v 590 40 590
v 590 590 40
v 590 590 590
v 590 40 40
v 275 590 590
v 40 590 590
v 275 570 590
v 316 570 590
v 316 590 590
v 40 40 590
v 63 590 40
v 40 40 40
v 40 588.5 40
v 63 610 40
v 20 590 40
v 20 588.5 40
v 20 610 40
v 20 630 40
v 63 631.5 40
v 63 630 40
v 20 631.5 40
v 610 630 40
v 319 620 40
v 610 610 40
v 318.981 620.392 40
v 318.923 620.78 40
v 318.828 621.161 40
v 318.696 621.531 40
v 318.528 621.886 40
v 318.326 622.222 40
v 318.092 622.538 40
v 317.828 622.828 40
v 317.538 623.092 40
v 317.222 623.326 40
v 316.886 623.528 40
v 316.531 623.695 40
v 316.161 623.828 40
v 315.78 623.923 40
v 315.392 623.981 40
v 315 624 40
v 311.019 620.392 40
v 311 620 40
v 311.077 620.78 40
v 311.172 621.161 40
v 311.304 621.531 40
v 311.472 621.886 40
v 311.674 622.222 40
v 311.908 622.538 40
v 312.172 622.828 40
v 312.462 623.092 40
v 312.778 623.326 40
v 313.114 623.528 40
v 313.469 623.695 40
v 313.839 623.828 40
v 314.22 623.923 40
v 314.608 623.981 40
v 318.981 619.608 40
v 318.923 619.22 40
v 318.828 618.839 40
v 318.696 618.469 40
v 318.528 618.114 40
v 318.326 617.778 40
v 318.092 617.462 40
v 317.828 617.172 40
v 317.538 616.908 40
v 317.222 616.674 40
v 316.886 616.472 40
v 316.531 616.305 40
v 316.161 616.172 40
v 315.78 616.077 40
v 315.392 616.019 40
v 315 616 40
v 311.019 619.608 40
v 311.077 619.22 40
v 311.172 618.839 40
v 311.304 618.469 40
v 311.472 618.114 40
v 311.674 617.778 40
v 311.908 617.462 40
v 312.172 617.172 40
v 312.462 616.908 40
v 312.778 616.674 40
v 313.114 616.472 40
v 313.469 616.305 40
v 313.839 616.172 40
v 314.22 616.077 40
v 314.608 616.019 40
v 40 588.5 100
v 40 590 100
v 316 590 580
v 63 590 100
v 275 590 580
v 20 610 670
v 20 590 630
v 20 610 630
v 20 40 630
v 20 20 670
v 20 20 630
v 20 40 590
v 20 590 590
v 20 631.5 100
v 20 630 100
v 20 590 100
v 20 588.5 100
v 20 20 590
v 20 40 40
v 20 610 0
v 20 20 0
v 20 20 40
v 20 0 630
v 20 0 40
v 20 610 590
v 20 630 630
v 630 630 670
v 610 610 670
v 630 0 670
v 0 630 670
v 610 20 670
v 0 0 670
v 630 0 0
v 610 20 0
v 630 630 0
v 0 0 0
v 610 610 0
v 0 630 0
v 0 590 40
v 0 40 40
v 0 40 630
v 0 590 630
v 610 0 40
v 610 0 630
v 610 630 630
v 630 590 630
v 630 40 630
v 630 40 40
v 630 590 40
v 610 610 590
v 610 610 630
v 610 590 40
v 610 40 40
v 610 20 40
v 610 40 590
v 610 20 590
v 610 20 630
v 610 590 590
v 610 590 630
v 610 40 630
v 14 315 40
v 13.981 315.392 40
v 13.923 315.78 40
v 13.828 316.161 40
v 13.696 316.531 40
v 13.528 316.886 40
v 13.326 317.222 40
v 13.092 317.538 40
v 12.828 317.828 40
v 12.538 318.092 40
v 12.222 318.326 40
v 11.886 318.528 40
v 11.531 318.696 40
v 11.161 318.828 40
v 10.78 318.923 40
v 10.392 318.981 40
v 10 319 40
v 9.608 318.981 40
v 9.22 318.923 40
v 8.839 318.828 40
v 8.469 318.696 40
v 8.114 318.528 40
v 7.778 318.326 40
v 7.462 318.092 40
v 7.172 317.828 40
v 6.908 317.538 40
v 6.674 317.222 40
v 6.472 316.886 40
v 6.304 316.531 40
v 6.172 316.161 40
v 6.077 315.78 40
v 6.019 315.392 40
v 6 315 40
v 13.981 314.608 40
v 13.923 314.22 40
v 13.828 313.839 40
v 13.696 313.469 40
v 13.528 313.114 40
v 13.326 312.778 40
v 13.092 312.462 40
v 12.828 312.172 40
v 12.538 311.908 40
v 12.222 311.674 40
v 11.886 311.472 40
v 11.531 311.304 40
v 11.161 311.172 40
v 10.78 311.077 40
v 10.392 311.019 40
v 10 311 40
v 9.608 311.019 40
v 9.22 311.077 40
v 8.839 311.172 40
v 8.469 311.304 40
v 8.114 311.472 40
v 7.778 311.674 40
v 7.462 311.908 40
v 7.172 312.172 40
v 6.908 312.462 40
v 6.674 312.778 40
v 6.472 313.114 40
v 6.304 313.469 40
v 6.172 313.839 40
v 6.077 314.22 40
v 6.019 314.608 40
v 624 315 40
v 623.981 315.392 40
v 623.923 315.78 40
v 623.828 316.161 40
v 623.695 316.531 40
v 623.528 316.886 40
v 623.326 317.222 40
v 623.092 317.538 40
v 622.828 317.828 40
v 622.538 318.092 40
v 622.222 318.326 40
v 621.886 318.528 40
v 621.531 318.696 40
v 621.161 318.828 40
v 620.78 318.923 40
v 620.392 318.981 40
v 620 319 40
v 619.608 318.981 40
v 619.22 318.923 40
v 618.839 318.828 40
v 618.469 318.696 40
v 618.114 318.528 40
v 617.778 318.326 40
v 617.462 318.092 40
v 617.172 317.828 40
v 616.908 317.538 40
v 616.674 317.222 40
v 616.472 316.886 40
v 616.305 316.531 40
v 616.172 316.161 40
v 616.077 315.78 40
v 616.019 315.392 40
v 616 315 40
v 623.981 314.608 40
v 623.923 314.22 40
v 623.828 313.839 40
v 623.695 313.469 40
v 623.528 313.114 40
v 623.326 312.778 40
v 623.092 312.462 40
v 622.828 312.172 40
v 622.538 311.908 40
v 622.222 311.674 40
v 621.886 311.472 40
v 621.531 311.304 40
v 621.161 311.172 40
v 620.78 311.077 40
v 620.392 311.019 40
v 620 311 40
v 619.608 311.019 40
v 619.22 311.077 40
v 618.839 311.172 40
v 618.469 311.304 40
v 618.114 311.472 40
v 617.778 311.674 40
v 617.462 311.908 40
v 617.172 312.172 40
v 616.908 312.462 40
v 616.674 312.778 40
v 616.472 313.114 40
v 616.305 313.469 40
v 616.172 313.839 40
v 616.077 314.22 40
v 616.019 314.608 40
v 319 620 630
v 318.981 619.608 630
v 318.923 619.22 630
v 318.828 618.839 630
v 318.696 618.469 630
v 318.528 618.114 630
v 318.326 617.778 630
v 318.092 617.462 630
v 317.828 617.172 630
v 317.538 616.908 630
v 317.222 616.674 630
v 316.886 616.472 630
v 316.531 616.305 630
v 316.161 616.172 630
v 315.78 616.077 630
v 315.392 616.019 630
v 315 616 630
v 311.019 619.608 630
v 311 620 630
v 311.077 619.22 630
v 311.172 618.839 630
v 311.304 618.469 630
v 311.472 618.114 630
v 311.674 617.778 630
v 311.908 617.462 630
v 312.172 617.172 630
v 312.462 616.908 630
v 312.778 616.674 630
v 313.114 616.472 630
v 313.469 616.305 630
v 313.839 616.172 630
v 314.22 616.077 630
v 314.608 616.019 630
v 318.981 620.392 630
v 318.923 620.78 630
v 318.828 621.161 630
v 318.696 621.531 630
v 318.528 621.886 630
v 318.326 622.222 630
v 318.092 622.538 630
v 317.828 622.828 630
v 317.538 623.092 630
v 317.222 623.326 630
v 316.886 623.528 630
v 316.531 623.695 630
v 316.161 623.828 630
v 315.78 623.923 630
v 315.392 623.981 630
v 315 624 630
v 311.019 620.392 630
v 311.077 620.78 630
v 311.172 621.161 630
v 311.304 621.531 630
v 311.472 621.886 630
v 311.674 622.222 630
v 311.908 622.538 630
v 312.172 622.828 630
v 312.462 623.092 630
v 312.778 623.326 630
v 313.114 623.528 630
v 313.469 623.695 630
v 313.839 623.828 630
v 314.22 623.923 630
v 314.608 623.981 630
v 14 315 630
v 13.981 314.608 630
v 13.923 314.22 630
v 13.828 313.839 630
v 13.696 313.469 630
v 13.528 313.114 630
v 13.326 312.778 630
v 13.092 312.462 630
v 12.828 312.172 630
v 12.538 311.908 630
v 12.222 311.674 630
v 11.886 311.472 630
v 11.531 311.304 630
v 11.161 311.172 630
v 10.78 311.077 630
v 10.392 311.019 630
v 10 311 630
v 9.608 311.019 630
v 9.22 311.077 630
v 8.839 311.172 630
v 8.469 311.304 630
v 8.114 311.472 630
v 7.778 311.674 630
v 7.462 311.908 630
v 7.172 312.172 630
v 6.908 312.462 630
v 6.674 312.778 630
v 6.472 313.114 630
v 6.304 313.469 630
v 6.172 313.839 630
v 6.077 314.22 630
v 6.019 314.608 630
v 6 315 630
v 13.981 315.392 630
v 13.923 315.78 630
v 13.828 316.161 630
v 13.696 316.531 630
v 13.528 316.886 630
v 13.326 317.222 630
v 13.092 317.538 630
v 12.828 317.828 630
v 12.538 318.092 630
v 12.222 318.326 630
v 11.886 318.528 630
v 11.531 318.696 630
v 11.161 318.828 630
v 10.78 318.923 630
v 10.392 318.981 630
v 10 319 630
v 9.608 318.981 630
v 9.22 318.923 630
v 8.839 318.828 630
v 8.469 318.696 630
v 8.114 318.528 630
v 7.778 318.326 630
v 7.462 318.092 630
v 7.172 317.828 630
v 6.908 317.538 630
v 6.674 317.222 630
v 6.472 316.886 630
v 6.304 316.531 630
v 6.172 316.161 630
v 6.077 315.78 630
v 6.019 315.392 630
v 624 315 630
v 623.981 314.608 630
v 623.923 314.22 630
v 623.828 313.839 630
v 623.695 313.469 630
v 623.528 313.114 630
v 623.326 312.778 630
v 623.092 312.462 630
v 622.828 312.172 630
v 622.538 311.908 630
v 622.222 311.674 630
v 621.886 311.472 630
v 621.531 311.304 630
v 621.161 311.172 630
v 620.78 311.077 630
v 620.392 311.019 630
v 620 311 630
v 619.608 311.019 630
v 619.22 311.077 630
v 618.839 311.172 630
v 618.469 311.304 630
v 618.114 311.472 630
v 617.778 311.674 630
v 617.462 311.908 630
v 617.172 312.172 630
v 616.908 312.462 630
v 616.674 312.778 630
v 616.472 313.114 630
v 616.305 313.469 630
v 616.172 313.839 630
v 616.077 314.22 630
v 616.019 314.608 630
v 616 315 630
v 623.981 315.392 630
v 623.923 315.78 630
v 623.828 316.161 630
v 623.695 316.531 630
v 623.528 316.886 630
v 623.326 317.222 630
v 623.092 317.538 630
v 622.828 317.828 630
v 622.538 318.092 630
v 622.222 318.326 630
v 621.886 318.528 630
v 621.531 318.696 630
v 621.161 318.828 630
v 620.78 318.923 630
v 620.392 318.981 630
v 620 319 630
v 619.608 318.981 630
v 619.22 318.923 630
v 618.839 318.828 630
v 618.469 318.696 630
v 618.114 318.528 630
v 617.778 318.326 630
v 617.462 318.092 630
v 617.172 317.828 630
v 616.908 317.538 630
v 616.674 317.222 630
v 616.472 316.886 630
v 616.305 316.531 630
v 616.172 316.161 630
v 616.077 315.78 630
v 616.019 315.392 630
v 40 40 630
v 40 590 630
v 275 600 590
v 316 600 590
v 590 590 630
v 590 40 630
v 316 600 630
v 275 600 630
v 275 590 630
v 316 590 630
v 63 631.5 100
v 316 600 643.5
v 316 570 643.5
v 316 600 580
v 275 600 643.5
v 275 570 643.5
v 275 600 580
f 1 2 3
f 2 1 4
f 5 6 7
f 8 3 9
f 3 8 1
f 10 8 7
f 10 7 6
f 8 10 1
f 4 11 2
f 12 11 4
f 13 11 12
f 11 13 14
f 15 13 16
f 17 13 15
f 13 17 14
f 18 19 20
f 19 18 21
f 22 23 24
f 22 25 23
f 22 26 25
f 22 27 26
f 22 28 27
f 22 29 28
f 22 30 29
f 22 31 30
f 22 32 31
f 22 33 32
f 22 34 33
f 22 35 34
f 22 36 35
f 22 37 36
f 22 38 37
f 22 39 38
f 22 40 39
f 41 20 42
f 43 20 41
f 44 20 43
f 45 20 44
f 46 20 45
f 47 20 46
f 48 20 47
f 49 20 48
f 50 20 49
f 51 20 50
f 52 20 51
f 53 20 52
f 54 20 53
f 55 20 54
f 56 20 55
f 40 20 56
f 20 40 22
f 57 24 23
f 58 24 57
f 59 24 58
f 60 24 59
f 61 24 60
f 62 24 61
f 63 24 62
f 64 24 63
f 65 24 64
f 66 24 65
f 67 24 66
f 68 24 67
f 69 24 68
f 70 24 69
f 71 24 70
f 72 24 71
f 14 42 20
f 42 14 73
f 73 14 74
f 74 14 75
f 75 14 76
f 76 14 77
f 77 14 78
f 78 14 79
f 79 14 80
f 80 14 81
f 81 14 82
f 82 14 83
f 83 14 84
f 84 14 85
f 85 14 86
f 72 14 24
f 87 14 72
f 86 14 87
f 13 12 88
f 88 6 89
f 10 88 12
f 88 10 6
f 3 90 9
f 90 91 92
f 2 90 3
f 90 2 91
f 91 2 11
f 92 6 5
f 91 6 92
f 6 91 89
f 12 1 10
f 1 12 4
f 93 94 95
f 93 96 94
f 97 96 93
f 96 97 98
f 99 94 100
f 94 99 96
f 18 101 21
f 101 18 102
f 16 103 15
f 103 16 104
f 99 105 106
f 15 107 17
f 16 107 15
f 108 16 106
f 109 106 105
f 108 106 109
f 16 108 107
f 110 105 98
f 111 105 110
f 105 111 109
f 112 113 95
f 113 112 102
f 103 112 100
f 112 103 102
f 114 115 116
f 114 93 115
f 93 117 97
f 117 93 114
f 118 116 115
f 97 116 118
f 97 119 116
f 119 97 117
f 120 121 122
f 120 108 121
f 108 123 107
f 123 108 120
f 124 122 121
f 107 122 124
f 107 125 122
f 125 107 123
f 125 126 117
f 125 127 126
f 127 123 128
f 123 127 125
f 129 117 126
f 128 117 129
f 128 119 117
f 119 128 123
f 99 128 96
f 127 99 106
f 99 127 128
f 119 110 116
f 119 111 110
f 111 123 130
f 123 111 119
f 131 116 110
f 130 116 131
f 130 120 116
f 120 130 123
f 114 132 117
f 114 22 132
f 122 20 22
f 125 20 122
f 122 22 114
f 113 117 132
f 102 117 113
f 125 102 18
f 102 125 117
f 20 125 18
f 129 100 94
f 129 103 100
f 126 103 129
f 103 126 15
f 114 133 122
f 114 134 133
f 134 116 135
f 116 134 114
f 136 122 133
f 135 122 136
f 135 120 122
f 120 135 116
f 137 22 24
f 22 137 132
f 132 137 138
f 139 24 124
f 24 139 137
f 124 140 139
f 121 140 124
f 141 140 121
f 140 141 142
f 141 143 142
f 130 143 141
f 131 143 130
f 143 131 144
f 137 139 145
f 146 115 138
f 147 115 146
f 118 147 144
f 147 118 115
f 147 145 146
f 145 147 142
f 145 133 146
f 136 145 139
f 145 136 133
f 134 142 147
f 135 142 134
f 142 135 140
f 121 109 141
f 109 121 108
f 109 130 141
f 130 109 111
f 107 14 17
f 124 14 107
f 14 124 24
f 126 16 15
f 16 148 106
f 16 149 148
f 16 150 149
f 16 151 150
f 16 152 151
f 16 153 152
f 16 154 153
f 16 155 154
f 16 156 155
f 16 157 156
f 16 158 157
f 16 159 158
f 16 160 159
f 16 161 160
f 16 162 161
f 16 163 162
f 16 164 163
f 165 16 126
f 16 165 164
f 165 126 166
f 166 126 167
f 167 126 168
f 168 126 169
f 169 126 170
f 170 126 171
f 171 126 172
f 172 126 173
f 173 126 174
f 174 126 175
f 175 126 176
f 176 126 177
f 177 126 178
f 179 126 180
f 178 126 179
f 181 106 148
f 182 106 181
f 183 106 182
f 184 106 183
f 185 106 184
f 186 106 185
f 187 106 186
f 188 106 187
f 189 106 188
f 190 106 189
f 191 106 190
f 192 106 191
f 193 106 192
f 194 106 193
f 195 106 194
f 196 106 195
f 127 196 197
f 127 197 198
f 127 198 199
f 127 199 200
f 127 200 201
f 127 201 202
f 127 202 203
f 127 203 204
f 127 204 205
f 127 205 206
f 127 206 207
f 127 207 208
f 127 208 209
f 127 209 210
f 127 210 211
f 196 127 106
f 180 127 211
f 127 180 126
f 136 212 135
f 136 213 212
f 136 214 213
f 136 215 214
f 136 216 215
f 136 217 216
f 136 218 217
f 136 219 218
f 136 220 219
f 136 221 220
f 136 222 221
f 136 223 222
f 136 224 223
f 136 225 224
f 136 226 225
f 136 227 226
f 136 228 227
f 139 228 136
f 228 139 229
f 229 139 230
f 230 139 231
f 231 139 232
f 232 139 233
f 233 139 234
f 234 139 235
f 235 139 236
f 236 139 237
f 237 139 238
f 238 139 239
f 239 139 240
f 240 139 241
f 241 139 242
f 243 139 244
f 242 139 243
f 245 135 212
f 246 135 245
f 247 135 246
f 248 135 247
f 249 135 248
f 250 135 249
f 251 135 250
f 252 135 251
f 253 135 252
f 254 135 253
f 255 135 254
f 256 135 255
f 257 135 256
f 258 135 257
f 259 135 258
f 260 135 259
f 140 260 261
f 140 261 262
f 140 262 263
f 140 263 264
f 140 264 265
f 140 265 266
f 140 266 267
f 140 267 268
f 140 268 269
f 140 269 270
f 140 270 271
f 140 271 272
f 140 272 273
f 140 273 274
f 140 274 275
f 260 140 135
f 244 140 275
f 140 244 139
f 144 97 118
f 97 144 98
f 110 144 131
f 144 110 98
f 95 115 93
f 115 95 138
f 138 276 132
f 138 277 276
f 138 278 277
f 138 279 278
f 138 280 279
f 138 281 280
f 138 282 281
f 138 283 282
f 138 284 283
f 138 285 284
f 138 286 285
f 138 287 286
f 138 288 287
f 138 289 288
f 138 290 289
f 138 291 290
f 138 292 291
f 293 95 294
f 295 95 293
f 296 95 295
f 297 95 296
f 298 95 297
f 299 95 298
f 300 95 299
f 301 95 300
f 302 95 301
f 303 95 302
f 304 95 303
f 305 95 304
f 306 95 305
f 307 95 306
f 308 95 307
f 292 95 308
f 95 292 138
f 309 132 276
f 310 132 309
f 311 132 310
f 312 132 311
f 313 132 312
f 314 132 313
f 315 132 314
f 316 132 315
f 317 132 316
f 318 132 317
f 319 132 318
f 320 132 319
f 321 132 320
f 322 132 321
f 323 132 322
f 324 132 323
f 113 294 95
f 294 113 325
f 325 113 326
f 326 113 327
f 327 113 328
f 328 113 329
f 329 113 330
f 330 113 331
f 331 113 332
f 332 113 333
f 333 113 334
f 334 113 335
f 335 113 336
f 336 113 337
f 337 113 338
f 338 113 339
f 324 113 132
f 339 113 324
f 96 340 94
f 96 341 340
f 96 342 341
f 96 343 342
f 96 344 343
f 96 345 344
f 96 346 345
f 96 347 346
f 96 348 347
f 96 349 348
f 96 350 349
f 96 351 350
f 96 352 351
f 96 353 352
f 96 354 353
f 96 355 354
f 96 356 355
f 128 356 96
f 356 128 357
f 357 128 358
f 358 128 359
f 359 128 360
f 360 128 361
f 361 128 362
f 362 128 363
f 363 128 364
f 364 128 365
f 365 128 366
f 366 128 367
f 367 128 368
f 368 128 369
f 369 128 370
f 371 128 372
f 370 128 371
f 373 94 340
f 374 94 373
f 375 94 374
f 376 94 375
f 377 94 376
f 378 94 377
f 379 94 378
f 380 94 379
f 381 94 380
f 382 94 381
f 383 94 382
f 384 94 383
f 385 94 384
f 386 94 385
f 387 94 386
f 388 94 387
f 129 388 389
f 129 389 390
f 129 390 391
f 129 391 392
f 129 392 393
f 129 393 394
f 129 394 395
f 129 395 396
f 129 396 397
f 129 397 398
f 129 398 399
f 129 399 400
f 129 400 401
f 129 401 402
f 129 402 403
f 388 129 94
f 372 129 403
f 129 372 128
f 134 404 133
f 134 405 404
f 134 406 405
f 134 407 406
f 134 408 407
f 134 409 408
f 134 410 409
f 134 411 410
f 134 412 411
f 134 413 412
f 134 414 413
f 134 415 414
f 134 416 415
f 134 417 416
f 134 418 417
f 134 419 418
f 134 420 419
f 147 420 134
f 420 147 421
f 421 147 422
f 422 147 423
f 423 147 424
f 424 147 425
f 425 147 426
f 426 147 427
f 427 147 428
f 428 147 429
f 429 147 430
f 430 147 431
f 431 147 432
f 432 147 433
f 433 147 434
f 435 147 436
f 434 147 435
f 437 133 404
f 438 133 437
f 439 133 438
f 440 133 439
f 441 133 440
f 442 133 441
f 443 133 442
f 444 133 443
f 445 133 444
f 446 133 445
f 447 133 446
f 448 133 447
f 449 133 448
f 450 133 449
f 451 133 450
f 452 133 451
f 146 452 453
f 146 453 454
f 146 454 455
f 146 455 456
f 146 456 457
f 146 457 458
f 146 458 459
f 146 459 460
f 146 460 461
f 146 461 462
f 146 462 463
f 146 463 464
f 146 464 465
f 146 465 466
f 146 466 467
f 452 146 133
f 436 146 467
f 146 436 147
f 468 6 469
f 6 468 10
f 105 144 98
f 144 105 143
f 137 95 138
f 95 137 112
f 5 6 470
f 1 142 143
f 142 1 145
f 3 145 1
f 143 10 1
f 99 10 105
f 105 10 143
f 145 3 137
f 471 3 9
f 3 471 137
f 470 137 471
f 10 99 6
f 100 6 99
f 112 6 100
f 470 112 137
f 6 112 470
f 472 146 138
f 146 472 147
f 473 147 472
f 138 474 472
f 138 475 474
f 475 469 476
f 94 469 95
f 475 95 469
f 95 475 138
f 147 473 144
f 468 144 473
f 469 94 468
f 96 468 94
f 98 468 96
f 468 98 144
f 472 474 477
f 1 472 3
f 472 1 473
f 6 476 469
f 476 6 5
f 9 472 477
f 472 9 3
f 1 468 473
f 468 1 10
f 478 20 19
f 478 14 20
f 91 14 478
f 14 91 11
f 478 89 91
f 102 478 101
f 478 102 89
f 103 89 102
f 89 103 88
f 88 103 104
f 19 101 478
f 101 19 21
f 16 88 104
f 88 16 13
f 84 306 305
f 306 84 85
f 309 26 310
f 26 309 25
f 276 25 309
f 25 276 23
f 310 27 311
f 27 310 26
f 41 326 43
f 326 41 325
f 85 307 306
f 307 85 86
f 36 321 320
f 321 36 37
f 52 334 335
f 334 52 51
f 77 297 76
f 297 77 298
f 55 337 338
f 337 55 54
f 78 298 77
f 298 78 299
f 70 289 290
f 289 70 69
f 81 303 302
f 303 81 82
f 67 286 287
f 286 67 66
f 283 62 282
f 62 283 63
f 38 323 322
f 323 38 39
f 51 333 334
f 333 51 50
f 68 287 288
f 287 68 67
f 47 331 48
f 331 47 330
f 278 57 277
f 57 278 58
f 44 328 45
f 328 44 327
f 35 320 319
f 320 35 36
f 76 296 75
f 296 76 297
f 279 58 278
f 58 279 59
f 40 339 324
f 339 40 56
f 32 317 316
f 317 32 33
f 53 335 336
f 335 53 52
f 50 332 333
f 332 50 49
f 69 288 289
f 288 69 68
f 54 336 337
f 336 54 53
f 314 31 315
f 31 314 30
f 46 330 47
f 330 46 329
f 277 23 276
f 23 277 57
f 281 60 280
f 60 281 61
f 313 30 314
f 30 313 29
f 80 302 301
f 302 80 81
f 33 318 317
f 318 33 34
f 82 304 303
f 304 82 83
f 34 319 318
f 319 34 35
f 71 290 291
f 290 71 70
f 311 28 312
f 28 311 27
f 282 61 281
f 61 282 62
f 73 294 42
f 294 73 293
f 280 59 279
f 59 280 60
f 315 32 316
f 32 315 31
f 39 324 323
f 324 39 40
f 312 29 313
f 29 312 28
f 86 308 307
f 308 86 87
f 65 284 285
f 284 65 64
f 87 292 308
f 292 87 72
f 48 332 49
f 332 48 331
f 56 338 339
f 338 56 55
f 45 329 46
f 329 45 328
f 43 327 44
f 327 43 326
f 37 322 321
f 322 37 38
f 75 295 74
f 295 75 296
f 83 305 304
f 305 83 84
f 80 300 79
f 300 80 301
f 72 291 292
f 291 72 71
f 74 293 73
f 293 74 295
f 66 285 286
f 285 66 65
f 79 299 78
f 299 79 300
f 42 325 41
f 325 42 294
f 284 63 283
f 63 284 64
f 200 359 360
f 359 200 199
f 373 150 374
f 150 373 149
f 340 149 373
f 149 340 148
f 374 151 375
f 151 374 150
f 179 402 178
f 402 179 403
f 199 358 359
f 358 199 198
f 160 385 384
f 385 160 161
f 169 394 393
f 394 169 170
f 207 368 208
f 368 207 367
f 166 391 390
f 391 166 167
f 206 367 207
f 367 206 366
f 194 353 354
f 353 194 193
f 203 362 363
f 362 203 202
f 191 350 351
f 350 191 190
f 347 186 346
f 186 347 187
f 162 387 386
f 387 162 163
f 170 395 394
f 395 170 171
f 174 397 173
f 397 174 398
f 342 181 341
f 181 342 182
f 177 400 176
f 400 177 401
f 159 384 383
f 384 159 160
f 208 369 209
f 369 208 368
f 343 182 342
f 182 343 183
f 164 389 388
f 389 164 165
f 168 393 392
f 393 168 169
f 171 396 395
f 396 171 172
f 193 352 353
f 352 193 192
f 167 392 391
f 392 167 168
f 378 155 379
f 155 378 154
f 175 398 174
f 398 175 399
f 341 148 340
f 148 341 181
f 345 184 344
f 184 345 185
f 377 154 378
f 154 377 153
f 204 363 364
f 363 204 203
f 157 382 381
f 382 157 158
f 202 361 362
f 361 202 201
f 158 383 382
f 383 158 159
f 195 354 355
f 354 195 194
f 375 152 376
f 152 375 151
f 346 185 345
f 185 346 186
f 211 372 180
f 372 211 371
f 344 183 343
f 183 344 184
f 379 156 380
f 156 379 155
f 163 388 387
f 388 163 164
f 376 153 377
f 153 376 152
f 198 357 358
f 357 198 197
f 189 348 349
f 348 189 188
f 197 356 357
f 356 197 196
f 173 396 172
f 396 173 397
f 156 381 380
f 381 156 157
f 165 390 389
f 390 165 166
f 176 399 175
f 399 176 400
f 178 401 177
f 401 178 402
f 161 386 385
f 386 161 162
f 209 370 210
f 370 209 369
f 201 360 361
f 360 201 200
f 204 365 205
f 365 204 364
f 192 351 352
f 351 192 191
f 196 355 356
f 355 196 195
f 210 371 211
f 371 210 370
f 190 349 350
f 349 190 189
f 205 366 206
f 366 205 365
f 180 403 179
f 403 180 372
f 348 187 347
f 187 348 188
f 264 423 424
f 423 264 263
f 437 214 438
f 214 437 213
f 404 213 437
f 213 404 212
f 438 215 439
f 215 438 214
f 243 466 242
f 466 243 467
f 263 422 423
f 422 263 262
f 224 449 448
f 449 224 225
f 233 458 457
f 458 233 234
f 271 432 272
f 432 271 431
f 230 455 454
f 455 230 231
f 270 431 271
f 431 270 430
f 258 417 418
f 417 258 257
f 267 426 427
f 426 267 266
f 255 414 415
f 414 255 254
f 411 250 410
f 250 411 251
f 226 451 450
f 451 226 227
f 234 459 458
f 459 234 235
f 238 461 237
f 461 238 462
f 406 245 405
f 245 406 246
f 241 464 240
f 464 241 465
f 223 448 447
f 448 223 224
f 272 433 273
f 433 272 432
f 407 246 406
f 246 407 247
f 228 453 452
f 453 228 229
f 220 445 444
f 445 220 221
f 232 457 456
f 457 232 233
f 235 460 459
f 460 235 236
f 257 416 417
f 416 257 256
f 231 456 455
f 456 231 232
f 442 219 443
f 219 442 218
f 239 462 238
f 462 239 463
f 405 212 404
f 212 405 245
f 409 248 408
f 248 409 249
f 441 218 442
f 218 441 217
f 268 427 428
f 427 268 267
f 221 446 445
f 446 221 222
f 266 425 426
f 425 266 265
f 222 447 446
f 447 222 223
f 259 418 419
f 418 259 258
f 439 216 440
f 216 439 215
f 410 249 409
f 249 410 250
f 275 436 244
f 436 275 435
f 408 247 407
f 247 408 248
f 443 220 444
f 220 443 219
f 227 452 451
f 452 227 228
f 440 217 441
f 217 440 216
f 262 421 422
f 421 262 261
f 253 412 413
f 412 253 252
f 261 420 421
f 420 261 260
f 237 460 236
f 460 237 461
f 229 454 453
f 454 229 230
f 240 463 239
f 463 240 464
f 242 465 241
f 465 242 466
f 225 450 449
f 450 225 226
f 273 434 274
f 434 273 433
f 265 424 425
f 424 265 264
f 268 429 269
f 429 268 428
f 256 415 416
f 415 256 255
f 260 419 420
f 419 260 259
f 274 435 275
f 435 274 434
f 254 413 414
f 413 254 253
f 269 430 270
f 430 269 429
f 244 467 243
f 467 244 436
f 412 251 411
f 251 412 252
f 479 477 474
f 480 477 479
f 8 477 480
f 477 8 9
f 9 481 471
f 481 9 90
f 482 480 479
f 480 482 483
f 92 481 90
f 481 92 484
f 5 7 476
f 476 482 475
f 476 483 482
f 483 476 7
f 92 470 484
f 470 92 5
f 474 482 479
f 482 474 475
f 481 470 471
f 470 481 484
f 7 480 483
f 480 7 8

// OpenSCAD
$fn=64;
union(){color("LIGHTBLUE"){translate(v = [40.000, 40.000, 40])
cube(size = [550, 550, 550]);
}
color("GREY"){cube(size = [20, 40, 670.000]);
}
#translate(v = [0, 590.000])
color("GREY"){cube(size = [20, 40, 670.000]);
}
translate(v = [610.000, 0])
translate(v = [0, 590.000])
color("GREY"){cube(size = [20, 40, 670.000]);
}
translate(v = [610.000, 0])
color("GREY"){cube(size = [20, 40, 670.000]);
}
translate(v = [20, 0])
rotate(a = [0, 90, 0])
rotate(a = [0, 0, 90])
color("GREY"){cube(size = [20, 40, 590.000]);
}
translate(v = [20, 610.000])
rotate(a = [0, 90, 0])
rotate(a = [0, 0, 90])
color("GREY"){cube(size = [20, 40, 590.000]);
}
translate(v = [20, 40])
rotate(a = [0, 0, 90])
rotate(a = [0, 90, 0])
rotate(a = [0, 0, 90])
color("GREY"){cube(size = [20, 40, 550.000]);
}
translate(v = [630.000, 40])
rotate(a = [0, 0, 90])
rotate(a = [0, 90, 0])
rotate(a = [0, 0, 90])
color("GREY"){cube(size = [20, 40, 550.000]);
}
translate(v = [20, 0, 630.000])
rotate(a = [0, 90, 0])
rotate(a = [0, 0, 90])
color("GREY"){cube(size = [20, 40, 590.000]);
}
translate(v = [20, 610.000, 630.000])
rotate(a = [0, 90, 0])
rotate(a = [0, 0, 90])
color("GREY"){cube(size = [20, 40, 590.000]);
}
translate(v = [20, 40, 630.000])
rotate(a = [0, 0, 90])
rotate(a = [0, 90, 0])
rotate(a = [0, 0, 90])
color("GREY"){cube(size = [20, 40, 550.000]);
}
translate(v = [630.000, 40, 630.000])
rotate(a = [0, 0, 90])
rotate(a = [0, 90, 0])
rotate(a = [0, 0, 90])
color("GREY"){cube(size = [20, 40, 550.000]);
}
#translate(v = [20, 610.000, 590])
rotate(a = [0, 90, 0])
rotate(a = [90, 0, 0])
rotate(a = [0, 0, 90])
color("GREY"){cube(size = [20, 40, 590.000]);
}
translate(v = [40.000, 590.000, 590])
rotate(a = [0, 90, 0])
rotate(a = [0, 0, 90])
color("GREY"){cube(size = [20, 40, 550]);
}
#translate(v = [610.000, 20, 590])
rotate(a = [0, 90, 0])
rotate(a = [-90, 0, 0])
rotate(a = [0, 0, 90])
color("GREY"){cube(size = [20, 40, 590.000]);
}
translate(v = [40.000, 20, 590])
rotate(a = [0, 90, 0])
rotate(a = [0, 0, 90])
color("GREY"){cube(size = [20, 40, 550]);
}
translate(v = [20, 588.500, 40])
color("BLUE"){cube(size = [43, 43, 60]);
}
translate(v = [315.000, 620.000, 40])
cylinder(h = 590, r = 4.000);
translate(v = [10.000, 315.000, 40])
cylinder(h = 590, r = 4.000);
translate(v = [620.000, 315.000, 40])
cylinder(h = 590, r = 4.000);
color("BLUE"){translate(v = [275.000, 570.000, 580])
cube(size = [41, 30, 63.500]);
}
}
